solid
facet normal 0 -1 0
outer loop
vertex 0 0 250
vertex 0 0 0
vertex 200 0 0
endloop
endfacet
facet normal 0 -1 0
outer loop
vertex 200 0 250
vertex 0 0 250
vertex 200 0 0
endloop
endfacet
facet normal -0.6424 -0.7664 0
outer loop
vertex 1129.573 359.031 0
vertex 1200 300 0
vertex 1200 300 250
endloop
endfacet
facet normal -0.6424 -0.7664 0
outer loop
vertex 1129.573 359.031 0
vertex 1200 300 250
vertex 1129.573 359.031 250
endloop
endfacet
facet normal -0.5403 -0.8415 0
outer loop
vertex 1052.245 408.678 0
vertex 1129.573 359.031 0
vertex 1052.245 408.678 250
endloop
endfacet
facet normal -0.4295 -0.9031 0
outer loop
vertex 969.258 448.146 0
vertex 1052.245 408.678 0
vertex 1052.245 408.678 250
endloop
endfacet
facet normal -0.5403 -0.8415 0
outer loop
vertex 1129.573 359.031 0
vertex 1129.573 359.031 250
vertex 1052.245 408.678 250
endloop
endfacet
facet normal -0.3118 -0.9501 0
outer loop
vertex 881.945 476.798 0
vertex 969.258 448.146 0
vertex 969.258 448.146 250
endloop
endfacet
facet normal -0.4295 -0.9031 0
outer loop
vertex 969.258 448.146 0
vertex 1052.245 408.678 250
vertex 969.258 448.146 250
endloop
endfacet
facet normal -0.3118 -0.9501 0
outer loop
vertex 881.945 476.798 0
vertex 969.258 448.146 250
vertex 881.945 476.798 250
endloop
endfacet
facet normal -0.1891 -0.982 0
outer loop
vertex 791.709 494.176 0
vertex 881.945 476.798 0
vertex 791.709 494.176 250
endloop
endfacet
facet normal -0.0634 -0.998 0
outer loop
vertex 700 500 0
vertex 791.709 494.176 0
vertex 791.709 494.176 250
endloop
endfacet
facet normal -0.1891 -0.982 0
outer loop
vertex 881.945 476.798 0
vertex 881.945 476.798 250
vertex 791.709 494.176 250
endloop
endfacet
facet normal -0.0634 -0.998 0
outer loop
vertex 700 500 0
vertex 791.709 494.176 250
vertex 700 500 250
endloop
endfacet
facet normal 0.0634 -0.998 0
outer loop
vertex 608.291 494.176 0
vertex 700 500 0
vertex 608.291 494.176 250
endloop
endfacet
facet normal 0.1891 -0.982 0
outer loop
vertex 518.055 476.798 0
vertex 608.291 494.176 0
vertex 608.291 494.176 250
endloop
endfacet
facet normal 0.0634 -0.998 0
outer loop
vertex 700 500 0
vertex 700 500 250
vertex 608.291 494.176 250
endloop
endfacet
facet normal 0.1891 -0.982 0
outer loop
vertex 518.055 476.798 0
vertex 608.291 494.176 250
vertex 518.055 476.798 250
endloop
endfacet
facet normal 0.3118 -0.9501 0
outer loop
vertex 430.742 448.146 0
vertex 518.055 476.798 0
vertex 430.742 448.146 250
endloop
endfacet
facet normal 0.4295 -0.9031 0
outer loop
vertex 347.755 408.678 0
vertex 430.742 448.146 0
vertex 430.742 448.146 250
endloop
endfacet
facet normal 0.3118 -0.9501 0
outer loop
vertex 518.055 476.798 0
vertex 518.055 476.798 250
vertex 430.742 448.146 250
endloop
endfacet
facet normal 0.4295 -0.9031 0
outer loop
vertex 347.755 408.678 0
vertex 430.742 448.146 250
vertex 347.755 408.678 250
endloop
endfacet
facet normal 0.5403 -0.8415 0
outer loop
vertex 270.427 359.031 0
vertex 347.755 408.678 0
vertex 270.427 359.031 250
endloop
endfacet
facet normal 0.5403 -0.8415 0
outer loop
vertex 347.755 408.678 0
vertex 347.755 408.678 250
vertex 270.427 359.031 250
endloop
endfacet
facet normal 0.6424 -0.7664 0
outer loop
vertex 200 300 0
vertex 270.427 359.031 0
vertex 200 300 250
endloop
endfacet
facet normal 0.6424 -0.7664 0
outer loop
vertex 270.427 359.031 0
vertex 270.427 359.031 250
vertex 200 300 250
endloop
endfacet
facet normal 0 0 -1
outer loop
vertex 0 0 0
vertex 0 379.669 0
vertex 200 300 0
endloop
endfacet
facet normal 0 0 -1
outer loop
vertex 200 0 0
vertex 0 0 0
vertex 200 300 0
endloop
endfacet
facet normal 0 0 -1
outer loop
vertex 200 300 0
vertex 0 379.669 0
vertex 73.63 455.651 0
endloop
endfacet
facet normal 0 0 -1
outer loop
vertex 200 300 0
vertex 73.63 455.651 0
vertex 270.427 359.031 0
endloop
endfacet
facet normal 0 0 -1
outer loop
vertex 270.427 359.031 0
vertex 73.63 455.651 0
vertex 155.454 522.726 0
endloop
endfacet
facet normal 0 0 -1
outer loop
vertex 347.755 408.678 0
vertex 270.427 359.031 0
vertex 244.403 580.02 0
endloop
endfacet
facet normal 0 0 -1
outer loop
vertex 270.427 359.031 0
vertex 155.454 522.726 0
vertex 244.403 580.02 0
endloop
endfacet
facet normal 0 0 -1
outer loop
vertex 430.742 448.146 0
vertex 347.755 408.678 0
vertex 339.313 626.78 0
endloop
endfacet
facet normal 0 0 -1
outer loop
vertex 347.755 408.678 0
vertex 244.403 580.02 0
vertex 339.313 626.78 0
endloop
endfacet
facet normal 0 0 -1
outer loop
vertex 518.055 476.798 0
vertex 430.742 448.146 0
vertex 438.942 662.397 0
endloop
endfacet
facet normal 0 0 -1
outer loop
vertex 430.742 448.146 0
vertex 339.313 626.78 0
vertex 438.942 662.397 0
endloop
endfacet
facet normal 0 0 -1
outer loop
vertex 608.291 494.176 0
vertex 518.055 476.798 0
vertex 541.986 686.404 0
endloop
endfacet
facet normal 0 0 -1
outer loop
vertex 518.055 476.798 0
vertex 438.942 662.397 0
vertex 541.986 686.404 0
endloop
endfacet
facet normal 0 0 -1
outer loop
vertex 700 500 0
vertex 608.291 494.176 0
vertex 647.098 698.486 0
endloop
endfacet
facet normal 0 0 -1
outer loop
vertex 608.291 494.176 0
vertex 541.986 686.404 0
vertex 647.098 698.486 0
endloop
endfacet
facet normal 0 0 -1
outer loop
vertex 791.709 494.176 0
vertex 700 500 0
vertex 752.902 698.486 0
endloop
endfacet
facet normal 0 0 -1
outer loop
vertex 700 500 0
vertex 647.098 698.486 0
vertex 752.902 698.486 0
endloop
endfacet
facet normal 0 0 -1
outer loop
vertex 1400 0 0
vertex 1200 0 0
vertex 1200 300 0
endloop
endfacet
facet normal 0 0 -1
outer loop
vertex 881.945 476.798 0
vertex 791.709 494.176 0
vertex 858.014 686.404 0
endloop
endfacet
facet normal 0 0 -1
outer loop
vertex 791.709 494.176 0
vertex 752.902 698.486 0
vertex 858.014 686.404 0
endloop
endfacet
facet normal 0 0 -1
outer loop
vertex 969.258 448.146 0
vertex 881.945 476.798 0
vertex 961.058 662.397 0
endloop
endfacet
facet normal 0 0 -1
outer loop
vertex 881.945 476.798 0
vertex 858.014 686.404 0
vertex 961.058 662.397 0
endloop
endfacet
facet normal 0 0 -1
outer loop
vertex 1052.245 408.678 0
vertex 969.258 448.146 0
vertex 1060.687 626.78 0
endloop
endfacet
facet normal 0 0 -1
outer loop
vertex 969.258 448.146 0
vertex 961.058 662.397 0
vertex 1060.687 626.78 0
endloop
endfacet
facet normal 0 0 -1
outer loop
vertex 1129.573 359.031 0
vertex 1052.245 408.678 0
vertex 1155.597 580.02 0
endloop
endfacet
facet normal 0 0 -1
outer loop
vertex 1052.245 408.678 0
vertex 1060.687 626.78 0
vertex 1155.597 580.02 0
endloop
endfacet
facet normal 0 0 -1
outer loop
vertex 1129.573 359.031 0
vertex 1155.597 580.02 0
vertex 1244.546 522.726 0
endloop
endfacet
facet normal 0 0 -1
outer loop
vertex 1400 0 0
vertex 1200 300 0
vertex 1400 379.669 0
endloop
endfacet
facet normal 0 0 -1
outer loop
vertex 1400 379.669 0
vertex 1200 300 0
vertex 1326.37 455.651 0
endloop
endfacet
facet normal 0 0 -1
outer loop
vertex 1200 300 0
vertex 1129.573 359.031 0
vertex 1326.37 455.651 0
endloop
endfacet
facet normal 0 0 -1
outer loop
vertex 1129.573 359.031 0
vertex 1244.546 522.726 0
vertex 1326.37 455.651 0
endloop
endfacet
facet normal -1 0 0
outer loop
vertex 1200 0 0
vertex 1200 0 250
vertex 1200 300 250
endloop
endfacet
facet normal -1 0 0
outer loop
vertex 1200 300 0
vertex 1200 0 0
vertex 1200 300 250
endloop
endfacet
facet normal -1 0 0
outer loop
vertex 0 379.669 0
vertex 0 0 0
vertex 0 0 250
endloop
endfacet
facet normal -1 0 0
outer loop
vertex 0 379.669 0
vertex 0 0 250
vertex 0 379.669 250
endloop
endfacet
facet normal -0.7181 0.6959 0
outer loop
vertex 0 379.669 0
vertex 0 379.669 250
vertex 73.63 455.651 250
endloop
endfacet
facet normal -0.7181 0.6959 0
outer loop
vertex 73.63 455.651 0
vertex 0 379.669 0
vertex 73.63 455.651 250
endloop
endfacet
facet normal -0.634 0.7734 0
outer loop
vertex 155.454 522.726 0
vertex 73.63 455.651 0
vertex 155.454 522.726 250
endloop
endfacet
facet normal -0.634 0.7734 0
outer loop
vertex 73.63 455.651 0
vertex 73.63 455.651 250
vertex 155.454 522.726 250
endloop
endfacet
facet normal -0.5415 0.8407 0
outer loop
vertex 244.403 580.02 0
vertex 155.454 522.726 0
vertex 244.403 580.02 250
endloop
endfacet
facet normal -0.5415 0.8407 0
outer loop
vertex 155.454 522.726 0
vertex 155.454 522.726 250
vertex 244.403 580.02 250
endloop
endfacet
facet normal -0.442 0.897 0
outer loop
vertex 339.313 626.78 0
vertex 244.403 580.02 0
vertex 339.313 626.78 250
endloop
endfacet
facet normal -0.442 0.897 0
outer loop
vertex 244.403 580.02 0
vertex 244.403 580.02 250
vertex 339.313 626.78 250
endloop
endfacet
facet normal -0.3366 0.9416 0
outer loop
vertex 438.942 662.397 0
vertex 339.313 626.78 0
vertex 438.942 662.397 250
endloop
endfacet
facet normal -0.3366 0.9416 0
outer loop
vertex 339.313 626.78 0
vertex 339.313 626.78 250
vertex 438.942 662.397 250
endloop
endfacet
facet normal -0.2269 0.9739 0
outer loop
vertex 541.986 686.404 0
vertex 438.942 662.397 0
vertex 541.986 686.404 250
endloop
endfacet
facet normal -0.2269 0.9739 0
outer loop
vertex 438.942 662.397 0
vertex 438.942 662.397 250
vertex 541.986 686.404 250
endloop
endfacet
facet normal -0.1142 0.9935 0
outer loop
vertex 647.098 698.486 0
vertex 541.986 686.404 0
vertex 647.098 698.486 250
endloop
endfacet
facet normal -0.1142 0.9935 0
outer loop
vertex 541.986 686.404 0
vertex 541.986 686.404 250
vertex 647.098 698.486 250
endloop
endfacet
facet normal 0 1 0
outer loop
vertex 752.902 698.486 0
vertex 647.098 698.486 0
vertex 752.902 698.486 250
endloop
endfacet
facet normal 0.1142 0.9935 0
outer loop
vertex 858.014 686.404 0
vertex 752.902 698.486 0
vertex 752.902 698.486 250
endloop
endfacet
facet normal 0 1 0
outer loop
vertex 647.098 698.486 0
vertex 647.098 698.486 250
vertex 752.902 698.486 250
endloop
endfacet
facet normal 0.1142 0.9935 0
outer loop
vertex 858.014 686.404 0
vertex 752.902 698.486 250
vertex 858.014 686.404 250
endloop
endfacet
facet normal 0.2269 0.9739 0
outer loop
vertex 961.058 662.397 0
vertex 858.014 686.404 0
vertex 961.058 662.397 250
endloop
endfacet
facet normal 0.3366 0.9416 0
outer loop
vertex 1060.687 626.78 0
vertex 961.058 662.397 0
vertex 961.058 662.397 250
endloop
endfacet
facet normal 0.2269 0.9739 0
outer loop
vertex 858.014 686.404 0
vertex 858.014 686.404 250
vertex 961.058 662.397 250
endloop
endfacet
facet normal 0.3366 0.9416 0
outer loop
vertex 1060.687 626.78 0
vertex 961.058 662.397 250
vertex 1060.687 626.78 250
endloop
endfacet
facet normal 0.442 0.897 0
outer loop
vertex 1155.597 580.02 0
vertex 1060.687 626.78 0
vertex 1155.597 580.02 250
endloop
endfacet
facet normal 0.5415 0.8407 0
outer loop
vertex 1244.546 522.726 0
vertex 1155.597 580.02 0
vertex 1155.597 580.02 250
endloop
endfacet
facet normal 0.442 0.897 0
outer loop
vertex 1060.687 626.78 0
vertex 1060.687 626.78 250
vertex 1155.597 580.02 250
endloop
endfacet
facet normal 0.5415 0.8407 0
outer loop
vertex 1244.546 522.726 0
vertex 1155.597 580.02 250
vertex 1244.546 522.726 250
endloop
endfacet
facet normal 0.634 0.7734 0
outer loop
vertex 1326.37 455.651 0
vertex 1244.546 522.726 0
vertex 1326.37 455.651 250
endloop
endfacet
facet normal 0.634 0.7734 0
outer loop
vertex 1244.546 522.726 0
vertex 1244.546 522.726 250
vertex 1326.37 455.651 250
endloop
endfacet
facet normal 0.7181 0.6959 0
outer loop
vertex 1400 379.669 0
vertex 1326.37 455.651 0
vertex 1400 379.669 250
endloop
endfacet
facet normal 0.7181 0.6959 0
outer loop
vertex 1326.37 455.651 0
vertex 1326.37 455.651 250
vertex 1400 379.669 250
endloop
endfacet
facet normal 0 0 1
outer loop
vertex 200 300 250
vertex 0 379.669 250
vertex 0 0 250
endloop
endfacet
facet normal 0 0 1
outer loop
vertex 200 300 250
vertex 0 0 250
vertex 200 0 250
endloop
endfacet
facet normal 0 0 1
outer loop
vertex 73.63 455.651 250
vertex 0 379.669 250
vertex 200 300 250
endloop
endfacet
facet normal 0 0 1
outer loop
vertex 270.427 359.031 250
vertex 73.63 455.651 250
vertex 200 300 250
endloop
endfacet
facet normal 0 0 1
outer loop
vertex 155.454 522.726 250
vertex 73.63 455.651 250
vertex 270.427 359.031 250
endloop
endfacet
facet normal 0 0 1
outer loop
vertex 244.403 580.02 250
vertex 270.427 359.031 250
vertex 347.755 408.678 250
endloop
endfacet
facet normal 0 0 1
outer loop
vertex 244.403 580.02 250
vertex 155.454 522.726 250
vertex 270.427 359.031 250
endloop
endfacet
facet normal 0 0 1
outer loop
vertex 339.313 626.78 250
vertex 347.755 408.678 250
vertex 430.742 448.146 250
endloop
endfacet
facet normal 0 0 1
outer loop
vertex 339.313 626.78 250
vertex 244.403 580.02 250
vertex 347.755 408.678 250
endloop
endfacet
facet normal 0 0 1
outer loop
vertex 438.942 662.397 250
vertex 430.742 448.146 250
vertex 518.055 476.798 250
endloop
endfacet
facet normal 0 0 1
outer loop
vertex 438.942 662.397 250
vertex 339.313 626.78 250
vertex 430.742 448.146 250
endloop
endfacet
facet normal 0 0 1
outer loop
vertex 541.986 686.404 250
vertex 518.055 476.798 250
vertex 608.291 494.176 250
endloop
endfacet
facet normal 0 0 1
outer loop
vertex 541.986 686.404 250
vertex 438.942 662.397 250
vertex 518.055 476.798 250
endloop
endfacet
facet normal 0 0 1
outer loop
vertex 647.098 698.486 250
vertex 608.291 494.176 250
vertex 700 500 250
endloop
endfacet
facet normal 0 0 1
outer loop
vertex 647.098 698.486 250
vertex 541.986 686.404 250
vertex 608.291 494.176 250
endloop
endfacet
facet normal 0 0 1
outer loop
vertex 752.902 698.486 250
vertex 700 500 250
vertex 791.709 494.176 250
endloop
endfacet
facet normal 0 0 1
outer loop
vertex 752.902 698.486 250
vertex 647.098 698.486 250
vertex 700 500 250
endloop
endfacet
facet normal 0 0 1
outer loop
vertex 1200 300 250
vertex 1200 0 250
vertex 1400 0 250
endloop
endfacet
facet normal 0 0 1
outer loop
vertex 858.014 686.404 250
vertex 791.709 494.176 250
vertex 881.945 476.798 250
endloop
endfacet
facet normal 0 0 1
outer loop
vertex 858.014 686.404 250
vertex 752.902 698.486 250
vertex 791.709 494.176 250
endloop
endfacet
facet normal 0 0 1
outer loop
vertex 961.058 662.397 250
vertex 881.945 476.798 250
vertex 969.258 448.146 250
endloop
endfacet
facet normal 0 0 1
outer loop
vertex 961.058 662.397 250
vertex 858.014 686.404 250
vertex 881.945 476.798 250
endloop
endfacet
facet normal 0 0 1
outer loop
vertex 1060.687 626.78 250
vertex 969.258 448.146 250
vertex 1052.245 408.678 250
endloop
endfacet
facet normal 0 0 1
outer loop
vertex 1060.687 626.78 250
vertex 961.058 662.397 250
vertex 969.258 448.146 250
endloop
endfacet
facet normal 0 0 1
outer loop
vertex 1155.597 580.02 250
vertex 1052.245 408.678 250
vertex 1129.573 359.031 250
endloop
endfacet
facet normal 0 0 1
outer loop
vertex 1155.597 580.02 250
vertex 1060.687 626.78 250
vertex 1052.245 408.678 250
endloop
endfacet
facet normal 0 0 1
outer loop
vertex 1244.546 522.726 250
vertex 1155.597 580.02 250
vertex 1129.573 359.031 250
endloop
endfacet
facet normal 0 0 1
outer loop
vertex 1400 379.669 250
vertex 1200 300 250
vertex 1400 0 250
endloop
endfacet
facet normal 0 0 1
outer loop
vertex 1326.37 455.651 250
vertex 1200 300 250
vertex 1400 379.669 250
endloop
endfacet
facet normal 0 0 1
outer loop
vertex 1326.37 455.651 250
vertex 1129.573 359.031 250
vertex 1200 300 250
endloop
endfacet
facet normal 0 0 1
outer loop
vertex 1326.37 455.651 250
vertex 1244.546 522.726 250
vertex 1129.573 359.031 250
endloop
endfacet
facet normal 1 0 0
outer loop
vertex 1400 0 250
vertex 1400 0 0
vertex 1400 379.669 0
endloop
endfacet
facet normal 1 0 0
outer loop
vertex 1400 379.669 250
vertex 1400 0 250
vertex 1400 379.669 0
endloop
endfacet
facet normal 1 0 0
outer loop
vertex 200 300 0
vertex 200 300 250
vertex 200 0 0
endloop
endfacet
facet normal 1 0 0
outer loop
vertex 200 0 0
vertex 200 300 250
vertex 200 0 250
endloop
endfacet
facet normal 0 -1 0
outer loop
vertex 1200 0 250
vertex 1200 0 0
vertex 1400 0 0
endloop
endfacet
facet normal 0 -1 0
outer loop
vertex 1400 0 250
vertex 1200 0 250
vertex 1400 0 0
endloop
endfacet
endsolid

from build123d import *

# Parameters (mm, degrees)
F0_W     = 1400
F0_H     = 700
F1_DEPTH = 250
F3_DEPTH = 250.001
F5_DEPTH = 250.001


with BuildPart() as f1:
    # F0 (on Top) → F1 (new body)
    with BuildSketch(Plane.XY):
        with Locations((700, 350)):
            Rectangle(F0_W, F0_H)
    extrude(amount=F1_DEPTH)

    # F2 (on face) → F3 (cut, through all)
    with BuildSketch(Plane.XY.offset(250)):
        with BuildLine():
            Line((200, 300), (200, 0))
            Line((200, 0), (1200, 0))
            Line((1200, 0), (1200, 300))
            ThreePointArc((1200, 300), (700, 500), (200, 300))
        make_face()
    extrude(amount=-F3_DEPTH, mode=Mode.SUBTRACT)

    # F4 (on face) → F5 (cut, through all)
    with BuildSketch(Plane.XY.offset(250)):
        with BuildLine():
            ThreePointArc((0, 379.6693311224), (315.0936031242, 616.1135866481), (700, 700))
            Line((700, 700), (0, 700))
            Line((0, 700), (0, 379.6693311224))
        make_face()
        with BuildLine():
            Line((1400, 700), (700, 700))
            ThreePointArc((700, 700), (1084.9063968758, 616.1135866481), (1400, 379.6693311224))
            Line((1400, 379.6693311224), (1400, 700))
        make_face()
    extrude(amount=-F5_DEPTH, mode=Mode.SUBTRACT)


solid = f1.part
